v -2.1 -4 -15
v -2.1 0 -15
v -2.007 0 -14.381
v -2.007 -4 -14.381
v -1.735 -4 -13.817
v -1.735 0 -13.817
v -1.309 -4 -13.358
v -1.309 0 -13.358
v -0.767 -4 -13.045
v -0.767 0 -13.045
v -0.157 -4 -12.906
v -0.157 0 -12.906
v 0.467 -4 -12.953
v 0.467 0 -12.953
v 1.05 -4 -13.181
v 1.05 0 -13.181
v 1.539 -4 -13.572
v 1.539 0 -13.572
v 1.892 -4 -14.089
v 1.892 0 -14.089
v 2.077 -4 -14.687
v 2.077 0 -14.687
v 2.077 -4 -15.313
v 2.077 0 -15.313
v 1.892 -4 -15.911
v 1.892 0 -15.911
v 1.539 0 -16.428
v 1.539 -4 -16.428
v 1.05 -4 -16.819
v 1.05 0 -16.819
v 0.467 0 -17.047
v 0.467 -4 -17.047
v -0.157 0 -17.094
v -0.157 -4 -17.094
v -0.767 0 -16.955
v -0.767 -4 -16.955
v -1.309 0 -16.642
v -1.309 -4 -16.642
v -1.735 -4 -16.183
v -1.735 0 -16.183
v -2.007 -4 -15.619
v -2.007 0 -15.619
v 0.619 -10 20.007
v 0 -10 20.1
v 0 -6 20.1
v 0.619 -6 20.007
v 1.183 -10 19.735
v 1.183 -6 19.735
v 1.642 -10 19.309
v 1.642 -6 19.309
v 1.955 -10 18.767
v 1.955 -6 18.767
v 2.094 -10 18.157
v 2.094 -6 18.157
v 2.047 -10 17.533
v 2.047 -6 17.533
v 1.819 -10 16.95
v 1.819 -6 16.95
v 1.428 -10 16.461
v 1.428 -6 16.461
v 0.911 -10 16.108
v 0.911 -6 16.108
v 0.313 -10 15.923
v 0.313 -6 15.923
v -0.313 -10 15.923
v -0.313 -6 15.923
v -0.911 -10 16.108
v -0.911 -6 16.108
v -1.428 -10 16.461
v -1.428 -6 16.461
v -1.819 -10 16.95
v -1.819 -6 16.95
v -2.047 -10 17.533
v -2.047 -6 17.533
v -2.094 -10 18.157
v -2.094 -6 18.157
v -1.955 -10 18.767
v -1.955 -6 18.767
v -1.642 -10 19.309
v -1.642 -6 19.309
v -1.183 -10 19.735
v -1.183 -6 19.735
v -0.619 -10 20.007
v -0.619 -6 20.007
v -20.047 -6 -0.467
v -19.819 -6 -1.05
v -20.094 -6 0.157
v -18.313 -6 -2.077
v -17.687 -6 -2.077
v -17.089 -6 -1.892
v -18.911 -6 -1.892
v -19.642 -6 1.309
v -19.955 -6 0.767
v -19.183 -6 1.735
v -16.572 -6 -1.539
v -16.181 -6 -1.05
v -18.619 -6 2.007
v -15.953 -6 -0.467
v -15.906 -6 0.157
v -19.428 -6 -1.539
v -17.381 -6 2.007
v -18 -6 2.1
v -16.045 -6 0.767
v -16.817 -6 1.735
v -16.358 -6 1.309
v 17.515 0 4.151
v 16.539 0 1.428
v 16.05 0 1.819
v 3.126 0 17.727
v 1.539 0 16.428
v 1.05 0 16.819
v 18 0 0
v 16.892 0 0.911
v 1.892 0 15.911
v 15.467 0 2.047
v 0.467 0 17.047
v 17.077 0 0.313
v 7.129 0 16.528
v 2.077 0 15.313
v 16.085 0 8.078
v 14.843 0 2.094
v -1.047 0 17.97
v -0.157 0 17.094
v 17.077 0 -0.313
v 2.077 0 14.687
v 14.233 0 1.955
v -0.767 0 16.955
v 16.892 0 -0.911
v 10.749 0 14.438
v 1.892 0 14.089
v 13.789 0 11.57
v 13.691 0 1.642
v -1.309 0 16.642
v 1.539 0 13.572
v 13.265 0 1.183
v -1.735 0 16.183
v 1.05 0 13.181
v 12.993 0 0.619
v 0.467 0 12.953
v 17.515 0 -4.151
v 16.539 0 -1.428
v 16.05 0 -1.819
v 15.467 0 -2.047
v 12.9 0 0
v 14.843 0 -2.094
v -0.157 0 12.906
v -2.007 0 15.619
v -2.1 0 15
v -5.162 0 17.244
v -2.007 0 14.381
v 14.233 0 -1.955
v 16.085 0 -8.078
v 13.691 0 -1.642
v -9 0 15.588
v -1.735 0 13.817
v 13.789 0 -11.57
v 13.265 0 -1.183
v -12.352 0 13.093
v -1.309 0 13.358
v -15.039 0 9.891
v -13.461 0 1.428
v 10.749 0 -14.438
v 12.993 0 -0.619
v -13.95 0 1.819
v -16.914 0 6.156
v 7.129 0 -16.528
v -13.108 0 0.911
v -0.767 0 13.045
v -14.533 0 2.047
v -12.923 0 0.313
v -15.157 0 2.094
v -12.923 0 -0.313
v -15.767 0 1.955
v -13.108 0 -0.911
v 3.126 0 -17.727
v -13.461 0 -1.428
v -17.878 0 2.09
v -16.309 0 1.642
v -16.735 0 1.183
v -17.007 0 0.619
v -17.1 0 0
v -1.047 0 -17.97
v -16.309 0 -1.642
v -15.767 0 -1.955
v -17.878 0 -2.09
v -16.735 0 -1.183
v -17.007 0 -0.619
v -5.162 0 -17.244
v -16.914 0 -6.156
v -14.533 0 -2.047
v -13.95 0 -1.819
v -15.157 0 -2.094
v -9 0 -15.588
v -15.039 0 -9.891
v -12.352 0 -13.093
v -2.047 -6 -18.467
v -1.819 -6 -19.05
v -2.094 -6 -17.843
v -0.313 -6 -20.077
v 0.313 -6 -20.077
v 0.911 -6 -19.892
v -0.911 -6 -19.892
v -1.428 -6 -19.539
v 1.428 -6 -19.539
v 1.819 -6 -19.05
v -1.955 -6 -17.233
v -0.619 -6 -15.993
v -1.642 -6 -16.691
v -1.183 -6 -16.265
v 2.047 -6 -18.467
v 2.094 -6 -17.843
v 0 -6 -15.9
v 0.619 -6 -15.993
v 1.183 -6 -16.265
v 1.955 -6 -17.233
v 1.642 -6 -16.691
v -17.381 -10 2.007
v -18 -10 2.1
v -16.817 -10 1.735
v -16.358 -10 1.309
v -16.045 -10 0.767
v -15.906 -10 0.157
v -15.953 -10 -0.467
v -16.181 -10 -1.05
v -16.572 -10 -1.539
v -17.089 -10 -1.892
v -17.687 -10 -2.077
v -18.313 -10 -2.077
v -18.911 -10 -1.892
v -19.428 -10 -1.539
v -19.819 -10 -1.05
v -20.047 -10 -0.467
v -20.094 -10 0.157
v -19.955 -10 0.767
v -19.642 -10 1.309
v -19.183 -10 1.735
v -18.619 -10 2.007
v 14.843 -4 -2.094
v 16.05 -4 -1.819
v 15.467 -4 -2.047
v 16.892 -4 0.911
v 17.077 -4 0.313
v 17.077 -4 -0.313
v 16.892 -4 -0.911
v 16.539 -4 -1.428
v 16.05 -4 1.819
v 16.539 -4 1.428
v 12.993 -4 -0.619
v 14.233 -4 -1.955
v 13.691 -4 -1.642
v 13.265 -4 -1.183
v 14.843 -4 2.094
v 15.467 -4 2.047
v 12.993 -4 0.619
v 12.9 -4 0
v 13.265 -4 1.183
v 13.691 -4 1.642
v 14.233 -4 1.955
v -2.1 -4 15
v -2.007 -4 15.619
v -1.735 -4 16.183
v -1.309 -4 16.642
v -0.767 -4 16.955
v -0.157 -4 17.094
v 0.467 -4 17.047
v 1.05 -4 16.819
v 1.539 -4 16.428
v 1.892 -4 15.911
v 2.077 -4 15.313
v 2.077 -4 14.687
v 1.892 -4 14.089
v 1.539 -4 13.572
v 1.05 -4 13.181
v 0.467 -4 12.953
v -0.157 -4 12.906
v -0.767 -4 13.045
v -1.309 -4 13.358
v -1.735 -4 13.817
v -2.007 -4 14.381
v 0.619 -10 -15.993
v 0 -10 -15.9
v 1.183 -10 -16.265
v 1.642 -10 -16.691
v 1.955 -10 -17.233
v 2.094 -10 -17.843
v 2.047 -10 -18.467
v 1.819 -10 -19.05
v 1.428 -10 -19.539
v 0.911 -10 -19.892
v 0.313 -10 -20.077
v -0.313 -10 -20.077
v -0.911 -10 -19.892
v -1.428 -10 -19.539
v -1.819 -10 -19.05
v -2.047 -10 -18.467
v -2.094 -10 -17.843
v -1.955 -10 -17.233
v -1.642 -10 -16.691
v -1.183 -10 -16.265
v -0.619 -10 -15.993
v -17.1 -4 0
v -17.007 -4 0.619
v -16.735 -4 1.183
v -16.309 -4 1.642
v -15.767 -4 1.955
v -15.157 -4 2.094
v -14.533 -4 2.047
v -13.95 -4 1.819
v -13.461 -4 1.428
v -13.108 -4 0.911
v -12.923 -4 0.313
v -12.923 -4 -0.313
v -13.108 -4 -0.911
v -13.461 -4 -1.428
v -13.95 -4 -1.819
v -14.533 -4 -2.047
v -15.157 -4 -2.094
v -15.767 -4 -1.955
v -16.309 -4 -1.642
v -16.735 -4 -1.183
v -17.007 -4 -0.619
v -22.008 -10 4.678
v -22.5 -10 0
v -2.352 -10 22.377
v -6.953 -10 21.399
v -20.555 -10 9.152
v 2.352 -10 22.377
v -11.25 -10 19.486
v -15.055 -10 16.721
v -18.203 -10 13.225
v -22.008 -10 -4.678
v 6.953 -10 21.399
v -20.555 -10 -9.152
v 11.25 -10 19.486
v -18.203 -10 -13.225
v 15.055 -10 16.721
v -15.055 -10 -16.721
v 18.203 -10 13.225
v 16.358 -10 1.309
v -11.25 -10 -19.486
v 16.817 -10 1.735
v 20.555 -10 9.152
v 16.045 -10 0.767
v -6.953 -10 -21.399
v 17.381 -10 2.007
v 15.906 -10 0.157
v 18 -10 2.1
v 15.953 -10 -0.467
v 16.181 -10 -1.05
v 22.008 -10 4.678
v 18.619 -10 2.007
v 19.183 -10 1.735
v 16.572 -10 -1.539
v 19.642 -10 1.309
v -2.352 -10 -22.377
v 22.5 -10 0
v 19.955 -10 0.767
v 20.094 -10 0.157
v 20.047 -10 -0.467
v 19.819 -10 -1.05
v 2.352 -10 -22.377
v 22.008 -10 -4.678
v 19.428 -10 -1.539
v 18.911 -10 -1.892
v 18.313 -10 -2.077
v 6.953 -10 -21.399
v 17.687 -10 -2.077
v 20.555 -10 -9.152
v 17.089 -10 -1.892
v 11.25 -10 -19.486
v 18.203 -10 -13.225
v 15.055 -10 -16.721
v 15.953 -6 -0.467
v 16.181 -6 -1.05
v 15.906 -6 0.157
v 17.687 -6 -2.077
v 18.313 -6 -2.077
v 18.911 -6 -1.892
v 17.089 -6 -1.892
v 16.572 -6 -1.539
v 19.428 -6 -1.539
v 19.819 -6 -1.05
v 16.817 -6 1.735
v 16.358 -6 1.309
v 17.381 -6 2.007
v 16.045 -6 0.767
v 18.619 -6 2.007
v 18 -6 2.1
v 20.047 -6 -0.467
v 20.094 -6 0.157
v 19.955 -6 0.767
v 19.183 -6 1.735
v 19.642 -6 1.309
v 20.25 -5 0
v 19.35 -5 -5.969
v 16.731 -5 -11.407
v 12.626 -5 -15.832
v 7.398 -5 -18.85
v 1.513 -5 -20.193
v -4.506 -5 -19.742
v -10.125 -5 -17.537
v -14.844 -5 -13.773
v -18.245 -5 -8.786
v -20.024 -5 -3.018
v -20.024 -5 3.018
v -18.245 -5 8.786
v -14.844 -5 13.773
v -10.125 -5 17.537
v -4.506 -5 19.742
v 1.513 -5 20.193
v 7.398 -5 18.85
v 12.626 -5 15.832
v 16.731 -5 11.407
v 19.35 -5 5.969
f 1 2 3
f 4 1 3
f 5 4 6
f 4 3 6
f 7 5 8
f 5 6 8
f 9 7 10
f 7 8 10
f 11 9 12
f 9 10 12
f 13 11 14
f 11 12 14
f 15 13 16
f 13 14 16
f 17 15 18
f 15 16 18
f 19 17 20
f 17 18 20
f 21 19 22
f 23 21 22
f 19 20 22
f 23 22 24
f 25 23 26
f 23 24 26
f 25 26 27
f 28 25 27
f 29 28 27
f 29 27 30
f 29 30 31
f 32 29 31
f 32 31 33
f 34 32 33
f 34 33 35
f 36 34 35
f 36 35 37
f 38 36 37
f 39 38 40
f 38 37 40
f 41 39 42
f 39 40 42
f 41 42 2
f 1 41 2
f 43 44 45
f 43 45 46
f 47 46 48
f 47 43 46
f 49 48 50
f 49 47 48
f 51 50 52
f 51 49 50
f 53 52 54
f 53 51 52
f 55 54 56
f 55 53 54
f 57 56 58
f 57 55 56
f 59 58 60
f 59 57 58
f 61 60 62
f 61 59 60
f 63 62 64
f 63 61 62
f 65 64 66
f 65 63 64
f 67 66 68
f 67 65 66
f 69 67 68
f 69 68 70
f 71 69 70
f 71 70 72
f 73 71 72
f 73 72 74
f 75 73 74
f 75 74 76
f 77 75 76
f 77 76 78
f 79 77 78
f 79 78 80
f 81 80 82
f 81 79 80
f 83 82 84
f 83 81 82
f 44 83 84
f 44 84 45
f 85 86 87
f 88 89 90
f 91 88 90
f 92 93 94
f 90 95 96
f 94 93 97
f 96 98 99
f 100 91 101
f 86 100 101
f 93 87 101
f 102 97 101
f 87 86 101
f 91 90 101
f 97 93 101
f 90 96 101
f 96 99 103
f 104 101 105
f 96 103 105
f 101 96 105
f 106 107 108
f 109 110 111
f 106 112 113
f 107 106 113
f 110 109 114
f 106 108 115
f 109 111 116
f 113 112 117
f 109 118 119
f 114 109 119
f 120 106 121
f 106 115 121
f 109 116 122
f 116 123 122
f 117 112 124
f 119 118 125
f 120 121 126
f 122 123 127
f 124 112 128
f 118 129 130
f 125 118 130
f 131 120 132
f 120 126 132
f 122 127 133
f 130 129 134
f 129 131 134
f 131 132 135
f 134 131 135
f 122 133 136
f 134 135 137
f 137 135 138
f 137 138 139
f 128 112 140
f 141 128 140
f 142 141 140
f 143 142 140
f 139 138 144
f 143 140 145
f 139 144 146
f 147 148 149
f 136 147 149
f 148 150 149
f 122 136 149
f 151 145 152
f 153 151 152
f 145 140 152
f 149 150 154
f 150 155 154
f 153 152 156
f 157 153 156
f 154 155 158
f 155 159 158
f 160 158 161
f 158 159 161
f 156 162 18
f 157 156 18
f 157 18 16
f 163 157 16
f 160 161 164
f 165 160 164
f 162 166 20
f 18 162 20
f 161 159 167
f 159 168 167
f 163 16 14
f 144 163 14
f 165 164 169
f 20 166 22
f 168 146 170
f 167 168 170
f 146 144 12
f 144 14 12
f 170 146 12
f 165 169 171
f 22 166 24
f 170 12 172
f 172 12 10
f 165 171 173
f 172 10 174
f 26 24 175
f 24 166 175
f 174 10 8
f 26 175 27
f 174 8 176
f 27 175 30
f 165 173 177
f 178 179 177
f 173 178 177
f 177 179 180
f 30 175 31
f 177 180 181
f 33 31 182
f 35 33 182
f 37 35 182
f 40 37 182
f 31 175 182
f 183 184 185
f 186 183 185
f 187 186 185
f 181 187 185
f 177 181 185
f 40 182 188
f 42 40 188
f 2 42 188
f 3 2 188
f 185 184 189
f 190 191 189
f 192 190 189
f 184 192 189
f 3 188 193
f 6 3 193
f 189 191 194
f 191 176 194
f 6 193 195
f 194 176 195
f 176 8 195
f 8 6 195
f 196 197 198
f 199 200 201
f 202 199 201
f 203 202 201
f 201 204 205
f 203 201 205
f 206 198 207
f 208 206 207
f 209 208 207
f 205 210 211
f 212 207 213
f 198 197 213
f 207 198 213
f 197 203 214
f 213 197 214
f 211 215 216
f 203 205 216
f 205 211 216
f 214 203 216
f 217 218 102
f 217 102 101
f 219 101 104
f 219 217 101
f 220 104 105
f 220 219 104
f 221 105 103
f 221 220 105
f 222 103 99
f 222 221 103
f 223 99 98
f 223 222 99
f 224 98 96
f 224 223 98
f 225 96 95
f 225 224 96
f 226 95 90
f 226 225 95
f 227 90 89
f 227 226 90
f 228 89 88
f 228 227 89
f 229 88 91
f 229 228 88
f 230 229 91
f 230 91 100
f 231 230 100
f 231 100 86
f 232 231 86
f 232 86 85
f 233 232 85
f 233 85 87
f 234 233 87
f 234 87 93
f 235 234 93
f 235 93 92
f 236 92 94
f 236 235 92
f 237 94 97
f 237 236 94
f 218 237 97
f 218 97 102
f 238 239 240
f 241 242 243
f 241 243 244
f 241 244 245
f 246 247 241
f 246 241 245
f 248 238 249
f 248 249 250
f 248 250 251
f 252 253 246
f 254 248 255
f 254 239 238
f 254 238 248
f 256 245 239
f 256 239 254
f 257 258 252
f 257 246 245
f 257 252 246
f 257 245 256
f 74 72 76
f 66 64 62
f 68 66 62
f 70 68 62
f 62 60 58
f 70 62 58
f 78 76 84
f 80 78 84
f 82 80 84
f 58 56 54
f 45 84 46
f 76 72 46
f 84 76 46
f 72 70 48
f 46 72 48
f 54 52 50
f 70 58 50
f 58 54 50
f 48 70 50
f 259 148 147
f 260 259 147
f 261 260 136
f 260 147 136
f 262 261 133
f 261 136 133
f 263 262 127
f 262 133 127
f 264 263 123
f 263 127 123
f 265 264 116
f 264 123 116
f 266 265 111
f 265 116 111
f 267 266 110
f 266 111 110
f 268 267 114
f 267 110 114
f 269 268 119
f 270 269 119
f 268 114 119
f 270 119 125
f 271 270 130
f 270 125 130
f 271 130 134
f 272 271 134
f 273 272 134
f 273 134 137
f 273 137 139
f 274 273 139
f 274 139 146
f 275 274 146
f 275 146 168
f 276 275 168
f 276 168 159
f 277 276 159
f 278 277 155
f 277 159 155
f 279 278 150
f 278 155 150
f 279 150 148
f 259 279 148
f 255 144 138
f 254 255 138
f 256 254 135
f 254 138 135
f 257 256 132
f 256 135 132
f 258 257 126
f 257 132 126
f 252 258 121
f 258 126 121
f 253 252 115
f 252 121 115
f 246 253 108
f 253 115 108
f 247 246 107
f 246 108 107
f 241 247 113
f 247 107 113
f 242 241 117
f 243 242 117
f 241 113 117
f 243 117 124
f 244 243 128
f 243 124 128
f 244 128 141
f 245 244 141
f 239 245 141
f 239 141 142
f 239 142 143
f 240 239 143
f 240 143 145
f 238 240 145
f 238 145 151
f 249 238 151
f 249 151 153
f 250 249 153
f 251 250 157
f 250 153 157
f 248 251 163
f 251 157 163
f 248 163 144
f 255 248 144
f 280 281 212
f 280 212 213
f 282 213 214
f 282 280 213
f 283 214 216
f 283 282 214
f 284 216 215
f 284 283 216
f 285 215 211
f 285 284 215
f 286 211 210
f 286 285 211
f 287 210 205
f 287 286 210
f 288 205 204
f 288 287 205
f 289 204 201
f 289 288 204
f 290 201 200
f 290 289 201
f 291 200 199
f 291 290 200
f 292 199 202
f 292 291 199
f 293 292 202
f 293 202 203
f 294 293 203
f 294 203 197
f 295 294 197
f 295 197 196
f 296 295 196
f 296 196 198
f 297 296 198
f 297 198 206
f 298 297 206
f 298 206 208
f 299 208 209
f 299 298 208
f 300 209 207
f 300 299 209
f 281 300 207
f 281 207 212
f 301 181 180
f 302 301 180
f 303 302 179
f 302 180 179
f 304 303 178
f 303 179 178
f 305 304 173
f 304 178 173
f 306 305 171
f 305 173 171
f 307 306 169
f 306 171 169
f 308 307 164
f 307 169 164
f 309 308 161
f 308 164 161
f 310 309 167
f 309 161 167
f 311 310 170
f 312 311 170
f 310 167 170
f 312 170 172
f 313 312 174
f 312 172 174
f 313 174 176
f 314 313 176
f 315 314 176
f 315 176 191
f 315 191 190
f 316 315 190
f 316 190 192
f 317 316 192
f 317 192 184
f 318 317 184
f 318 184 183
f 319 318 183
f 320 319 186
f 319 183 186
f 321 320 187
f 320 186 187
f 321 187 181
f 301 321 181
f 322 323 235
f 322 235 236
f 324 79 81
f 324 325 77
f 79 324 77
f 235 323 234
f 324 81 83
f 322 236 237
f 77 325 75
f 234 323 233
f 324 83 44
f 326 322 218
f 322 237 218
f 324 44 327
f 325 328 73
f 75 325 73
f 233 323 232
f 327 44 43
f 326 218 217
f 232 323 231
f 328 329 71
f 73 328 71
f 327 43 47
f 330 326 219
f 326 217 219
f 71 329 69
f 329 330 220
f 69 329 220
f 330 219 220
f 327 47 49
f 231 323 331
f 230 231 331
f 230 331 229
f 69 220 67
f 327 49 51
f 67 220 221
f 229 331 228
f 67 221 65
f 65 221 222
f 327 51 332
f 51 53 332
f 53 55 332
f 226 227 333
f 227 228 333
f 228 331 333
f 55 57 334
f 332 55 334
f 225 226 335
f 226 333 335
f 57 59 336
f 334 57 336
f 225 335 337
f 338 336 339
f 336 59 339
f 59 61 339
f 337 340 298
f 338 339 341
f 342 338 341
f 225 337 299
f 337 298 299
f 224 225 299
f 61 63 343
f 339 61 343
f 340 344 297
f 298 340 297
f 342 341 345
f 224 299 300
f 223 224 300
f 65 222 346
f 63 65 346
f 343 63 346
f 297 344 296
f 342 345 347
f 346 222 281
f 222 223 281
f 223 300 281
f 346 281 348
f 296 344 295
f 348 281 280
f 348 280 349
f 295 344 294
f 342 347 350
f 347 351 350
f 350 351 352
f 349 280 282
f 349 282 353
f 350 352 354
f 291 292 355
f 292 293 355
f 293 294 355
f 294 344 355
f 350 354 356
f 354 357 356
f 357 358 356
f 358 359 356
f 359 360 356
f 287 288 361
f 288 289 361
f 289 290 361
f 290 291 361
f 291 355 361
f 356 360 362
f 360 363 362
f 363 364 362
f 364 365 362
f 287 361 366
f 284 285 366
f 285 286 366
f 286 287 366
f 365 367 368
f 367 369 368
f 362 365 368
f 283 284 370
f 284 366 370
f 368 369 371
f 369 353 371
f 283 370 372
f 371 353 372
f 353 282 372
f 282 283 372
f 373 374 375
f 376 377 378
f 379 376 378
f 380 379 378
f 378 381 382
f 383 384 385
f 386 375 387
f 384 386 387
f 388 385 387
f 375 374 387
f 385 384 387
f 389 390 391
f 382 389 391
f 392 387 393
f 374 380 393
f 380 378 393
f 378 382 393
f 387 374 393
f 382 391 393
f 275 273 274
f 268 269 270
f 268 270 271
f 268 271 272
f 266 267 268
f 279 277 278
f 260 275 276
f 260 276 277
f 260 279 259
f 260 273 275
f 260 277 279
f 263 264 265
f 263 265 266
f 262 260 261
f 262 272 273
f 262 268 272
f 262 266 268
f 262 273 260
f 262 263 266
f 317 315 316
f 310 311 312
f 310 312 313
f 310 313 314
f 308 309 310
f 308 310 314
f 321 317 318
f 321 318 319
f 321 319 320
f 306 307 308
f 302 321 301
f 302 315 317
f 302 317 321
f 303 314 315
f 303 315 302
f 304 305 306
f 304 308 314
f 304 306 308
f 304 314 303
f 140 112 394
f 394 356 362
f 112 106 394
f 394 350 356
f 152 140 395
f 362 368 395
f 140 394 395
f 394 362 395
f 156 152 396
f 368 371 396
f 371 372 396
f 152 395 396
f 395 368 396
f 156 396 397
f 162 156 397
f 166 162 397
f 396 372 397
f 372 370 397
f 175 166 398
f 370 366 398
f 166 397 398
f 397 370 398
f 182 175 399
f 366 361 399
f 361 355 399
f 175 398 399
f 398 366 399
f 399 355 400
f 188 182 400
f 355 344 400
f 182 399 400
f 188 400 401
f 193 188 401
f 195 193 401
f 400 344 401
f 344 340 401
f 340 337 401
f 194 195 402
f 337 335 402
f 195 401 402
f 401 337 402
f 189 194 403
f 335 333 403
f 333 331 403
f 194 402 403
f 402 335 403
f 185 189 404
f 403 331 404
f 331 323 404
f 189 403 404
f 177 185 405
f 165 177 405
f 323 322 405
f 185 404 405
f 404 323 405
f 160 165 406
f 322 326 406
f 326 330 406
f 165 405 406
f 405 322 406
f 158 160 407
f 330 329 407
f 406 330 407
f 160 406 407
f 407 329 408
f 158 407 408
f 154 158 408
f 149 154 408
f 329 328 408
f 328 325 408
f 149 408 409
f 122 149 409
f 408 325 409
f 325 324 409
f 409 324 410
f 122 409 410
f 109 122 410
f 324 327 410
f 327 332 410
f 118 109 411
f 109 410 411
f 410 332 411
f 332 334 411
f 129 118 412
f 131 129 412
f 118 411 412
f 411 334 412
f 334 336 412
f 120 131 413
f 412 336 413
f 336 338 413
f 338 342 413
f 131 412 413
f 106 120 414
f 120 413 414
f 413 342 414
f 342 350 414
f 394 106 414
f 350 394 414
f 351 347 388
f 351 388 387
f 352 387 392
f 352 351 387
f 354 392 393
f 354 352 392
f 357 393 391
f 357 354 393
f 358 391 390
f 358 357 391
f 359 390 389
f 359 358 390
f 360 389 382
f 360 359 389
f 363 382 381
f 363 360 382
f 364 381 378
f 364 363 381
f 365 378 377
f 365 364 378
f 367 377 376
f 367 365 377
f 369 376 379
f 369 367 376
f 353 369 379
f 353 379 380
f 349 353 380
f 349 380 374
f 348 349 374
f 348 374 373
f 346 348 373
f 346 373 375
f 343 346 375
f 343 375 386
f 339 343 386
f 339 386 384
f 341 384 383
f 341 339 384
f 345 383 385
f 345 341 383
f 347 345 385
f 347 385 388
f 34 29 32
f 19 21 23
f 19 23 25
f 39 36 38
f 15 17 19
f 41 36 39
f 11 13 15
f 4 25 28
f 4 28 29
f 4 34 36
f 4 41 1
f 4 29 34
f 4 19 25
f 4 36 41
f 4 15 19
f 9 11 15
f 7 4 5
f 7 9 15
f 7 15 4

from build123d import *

# Parameters (mm, degrees)
SKETCH_26_R         = 2.1
CUT_EXTRUDE_2_DEPTH = 4
SKETCH_36_R         = 2.1
CUT_EXTRUDE_3_DEPTH = 4


with BuildPart() as part:
    # 草图8 → 旋转1 (revolve)
    with BuildSketch(Plane(origin=(0, 0, 0), x_dir=(-1, 0, 0), z_dir=(0, 0, -1))):
        Polygon((0, 0), (-18, 0), (-22.5, -10), (0, -10), align=None)
    revolve(axis=Axis((0, -10, 0), (0, 1, 0)))

    # 草图26 → 切除-拉伸2 (cut)
    with BuildSketch(Plane(origin=(0, -10, 0), x_dir=(1, 0, 0), z_dir=(0, 1, 0))):
        with Locations(Location((18, 0, 0), (0, 0, 270))):
            Circle(SKETCH_26_R)
        with Locations(Location((0, -18, 0), (0, 0, 270))):
            Circle(SKETCH_26_R)
        with Locations(Location((0, 18, 0), (0, 0, 270))):
            Circle(SKETCH_26_R)
        with Locations(Location((-18, 0, 0), (0, 0, 270))):
            Circle(SKETCH_26_R)
    extrude(amount=CUT_EXTRUDE_2_DEPTH, mode=Mode.SUBTRACT)

    # 草图36 → 切除-拉伸3 (cut)
    with BuildSketch(Plane(origin=(0, 0, 0), x_dir=(1, 0, 0), z_dir=(0, 1, 0))):
        with Locations(Location((0, 15, 0), (0, 0, 180))):
            Circle(SKETCH_36_R)
        with Locations(Location((15, 0, 0), (0, 0, 180))):
            Circle(SKETCH_36_R)
        with Locations(Location((0, -15, 0), (0, 0, 180))):
            Circle(SKETCH_36_R)
        with Locations(Location((-15, 0, 0), (0, 0, 180))):
            Circle(SKETCH_36_R)
    extrude(amount=-CUT_EXTRUDE_3_DEPTH, mode=Mode.SUBTRACT)


solid = part.part
